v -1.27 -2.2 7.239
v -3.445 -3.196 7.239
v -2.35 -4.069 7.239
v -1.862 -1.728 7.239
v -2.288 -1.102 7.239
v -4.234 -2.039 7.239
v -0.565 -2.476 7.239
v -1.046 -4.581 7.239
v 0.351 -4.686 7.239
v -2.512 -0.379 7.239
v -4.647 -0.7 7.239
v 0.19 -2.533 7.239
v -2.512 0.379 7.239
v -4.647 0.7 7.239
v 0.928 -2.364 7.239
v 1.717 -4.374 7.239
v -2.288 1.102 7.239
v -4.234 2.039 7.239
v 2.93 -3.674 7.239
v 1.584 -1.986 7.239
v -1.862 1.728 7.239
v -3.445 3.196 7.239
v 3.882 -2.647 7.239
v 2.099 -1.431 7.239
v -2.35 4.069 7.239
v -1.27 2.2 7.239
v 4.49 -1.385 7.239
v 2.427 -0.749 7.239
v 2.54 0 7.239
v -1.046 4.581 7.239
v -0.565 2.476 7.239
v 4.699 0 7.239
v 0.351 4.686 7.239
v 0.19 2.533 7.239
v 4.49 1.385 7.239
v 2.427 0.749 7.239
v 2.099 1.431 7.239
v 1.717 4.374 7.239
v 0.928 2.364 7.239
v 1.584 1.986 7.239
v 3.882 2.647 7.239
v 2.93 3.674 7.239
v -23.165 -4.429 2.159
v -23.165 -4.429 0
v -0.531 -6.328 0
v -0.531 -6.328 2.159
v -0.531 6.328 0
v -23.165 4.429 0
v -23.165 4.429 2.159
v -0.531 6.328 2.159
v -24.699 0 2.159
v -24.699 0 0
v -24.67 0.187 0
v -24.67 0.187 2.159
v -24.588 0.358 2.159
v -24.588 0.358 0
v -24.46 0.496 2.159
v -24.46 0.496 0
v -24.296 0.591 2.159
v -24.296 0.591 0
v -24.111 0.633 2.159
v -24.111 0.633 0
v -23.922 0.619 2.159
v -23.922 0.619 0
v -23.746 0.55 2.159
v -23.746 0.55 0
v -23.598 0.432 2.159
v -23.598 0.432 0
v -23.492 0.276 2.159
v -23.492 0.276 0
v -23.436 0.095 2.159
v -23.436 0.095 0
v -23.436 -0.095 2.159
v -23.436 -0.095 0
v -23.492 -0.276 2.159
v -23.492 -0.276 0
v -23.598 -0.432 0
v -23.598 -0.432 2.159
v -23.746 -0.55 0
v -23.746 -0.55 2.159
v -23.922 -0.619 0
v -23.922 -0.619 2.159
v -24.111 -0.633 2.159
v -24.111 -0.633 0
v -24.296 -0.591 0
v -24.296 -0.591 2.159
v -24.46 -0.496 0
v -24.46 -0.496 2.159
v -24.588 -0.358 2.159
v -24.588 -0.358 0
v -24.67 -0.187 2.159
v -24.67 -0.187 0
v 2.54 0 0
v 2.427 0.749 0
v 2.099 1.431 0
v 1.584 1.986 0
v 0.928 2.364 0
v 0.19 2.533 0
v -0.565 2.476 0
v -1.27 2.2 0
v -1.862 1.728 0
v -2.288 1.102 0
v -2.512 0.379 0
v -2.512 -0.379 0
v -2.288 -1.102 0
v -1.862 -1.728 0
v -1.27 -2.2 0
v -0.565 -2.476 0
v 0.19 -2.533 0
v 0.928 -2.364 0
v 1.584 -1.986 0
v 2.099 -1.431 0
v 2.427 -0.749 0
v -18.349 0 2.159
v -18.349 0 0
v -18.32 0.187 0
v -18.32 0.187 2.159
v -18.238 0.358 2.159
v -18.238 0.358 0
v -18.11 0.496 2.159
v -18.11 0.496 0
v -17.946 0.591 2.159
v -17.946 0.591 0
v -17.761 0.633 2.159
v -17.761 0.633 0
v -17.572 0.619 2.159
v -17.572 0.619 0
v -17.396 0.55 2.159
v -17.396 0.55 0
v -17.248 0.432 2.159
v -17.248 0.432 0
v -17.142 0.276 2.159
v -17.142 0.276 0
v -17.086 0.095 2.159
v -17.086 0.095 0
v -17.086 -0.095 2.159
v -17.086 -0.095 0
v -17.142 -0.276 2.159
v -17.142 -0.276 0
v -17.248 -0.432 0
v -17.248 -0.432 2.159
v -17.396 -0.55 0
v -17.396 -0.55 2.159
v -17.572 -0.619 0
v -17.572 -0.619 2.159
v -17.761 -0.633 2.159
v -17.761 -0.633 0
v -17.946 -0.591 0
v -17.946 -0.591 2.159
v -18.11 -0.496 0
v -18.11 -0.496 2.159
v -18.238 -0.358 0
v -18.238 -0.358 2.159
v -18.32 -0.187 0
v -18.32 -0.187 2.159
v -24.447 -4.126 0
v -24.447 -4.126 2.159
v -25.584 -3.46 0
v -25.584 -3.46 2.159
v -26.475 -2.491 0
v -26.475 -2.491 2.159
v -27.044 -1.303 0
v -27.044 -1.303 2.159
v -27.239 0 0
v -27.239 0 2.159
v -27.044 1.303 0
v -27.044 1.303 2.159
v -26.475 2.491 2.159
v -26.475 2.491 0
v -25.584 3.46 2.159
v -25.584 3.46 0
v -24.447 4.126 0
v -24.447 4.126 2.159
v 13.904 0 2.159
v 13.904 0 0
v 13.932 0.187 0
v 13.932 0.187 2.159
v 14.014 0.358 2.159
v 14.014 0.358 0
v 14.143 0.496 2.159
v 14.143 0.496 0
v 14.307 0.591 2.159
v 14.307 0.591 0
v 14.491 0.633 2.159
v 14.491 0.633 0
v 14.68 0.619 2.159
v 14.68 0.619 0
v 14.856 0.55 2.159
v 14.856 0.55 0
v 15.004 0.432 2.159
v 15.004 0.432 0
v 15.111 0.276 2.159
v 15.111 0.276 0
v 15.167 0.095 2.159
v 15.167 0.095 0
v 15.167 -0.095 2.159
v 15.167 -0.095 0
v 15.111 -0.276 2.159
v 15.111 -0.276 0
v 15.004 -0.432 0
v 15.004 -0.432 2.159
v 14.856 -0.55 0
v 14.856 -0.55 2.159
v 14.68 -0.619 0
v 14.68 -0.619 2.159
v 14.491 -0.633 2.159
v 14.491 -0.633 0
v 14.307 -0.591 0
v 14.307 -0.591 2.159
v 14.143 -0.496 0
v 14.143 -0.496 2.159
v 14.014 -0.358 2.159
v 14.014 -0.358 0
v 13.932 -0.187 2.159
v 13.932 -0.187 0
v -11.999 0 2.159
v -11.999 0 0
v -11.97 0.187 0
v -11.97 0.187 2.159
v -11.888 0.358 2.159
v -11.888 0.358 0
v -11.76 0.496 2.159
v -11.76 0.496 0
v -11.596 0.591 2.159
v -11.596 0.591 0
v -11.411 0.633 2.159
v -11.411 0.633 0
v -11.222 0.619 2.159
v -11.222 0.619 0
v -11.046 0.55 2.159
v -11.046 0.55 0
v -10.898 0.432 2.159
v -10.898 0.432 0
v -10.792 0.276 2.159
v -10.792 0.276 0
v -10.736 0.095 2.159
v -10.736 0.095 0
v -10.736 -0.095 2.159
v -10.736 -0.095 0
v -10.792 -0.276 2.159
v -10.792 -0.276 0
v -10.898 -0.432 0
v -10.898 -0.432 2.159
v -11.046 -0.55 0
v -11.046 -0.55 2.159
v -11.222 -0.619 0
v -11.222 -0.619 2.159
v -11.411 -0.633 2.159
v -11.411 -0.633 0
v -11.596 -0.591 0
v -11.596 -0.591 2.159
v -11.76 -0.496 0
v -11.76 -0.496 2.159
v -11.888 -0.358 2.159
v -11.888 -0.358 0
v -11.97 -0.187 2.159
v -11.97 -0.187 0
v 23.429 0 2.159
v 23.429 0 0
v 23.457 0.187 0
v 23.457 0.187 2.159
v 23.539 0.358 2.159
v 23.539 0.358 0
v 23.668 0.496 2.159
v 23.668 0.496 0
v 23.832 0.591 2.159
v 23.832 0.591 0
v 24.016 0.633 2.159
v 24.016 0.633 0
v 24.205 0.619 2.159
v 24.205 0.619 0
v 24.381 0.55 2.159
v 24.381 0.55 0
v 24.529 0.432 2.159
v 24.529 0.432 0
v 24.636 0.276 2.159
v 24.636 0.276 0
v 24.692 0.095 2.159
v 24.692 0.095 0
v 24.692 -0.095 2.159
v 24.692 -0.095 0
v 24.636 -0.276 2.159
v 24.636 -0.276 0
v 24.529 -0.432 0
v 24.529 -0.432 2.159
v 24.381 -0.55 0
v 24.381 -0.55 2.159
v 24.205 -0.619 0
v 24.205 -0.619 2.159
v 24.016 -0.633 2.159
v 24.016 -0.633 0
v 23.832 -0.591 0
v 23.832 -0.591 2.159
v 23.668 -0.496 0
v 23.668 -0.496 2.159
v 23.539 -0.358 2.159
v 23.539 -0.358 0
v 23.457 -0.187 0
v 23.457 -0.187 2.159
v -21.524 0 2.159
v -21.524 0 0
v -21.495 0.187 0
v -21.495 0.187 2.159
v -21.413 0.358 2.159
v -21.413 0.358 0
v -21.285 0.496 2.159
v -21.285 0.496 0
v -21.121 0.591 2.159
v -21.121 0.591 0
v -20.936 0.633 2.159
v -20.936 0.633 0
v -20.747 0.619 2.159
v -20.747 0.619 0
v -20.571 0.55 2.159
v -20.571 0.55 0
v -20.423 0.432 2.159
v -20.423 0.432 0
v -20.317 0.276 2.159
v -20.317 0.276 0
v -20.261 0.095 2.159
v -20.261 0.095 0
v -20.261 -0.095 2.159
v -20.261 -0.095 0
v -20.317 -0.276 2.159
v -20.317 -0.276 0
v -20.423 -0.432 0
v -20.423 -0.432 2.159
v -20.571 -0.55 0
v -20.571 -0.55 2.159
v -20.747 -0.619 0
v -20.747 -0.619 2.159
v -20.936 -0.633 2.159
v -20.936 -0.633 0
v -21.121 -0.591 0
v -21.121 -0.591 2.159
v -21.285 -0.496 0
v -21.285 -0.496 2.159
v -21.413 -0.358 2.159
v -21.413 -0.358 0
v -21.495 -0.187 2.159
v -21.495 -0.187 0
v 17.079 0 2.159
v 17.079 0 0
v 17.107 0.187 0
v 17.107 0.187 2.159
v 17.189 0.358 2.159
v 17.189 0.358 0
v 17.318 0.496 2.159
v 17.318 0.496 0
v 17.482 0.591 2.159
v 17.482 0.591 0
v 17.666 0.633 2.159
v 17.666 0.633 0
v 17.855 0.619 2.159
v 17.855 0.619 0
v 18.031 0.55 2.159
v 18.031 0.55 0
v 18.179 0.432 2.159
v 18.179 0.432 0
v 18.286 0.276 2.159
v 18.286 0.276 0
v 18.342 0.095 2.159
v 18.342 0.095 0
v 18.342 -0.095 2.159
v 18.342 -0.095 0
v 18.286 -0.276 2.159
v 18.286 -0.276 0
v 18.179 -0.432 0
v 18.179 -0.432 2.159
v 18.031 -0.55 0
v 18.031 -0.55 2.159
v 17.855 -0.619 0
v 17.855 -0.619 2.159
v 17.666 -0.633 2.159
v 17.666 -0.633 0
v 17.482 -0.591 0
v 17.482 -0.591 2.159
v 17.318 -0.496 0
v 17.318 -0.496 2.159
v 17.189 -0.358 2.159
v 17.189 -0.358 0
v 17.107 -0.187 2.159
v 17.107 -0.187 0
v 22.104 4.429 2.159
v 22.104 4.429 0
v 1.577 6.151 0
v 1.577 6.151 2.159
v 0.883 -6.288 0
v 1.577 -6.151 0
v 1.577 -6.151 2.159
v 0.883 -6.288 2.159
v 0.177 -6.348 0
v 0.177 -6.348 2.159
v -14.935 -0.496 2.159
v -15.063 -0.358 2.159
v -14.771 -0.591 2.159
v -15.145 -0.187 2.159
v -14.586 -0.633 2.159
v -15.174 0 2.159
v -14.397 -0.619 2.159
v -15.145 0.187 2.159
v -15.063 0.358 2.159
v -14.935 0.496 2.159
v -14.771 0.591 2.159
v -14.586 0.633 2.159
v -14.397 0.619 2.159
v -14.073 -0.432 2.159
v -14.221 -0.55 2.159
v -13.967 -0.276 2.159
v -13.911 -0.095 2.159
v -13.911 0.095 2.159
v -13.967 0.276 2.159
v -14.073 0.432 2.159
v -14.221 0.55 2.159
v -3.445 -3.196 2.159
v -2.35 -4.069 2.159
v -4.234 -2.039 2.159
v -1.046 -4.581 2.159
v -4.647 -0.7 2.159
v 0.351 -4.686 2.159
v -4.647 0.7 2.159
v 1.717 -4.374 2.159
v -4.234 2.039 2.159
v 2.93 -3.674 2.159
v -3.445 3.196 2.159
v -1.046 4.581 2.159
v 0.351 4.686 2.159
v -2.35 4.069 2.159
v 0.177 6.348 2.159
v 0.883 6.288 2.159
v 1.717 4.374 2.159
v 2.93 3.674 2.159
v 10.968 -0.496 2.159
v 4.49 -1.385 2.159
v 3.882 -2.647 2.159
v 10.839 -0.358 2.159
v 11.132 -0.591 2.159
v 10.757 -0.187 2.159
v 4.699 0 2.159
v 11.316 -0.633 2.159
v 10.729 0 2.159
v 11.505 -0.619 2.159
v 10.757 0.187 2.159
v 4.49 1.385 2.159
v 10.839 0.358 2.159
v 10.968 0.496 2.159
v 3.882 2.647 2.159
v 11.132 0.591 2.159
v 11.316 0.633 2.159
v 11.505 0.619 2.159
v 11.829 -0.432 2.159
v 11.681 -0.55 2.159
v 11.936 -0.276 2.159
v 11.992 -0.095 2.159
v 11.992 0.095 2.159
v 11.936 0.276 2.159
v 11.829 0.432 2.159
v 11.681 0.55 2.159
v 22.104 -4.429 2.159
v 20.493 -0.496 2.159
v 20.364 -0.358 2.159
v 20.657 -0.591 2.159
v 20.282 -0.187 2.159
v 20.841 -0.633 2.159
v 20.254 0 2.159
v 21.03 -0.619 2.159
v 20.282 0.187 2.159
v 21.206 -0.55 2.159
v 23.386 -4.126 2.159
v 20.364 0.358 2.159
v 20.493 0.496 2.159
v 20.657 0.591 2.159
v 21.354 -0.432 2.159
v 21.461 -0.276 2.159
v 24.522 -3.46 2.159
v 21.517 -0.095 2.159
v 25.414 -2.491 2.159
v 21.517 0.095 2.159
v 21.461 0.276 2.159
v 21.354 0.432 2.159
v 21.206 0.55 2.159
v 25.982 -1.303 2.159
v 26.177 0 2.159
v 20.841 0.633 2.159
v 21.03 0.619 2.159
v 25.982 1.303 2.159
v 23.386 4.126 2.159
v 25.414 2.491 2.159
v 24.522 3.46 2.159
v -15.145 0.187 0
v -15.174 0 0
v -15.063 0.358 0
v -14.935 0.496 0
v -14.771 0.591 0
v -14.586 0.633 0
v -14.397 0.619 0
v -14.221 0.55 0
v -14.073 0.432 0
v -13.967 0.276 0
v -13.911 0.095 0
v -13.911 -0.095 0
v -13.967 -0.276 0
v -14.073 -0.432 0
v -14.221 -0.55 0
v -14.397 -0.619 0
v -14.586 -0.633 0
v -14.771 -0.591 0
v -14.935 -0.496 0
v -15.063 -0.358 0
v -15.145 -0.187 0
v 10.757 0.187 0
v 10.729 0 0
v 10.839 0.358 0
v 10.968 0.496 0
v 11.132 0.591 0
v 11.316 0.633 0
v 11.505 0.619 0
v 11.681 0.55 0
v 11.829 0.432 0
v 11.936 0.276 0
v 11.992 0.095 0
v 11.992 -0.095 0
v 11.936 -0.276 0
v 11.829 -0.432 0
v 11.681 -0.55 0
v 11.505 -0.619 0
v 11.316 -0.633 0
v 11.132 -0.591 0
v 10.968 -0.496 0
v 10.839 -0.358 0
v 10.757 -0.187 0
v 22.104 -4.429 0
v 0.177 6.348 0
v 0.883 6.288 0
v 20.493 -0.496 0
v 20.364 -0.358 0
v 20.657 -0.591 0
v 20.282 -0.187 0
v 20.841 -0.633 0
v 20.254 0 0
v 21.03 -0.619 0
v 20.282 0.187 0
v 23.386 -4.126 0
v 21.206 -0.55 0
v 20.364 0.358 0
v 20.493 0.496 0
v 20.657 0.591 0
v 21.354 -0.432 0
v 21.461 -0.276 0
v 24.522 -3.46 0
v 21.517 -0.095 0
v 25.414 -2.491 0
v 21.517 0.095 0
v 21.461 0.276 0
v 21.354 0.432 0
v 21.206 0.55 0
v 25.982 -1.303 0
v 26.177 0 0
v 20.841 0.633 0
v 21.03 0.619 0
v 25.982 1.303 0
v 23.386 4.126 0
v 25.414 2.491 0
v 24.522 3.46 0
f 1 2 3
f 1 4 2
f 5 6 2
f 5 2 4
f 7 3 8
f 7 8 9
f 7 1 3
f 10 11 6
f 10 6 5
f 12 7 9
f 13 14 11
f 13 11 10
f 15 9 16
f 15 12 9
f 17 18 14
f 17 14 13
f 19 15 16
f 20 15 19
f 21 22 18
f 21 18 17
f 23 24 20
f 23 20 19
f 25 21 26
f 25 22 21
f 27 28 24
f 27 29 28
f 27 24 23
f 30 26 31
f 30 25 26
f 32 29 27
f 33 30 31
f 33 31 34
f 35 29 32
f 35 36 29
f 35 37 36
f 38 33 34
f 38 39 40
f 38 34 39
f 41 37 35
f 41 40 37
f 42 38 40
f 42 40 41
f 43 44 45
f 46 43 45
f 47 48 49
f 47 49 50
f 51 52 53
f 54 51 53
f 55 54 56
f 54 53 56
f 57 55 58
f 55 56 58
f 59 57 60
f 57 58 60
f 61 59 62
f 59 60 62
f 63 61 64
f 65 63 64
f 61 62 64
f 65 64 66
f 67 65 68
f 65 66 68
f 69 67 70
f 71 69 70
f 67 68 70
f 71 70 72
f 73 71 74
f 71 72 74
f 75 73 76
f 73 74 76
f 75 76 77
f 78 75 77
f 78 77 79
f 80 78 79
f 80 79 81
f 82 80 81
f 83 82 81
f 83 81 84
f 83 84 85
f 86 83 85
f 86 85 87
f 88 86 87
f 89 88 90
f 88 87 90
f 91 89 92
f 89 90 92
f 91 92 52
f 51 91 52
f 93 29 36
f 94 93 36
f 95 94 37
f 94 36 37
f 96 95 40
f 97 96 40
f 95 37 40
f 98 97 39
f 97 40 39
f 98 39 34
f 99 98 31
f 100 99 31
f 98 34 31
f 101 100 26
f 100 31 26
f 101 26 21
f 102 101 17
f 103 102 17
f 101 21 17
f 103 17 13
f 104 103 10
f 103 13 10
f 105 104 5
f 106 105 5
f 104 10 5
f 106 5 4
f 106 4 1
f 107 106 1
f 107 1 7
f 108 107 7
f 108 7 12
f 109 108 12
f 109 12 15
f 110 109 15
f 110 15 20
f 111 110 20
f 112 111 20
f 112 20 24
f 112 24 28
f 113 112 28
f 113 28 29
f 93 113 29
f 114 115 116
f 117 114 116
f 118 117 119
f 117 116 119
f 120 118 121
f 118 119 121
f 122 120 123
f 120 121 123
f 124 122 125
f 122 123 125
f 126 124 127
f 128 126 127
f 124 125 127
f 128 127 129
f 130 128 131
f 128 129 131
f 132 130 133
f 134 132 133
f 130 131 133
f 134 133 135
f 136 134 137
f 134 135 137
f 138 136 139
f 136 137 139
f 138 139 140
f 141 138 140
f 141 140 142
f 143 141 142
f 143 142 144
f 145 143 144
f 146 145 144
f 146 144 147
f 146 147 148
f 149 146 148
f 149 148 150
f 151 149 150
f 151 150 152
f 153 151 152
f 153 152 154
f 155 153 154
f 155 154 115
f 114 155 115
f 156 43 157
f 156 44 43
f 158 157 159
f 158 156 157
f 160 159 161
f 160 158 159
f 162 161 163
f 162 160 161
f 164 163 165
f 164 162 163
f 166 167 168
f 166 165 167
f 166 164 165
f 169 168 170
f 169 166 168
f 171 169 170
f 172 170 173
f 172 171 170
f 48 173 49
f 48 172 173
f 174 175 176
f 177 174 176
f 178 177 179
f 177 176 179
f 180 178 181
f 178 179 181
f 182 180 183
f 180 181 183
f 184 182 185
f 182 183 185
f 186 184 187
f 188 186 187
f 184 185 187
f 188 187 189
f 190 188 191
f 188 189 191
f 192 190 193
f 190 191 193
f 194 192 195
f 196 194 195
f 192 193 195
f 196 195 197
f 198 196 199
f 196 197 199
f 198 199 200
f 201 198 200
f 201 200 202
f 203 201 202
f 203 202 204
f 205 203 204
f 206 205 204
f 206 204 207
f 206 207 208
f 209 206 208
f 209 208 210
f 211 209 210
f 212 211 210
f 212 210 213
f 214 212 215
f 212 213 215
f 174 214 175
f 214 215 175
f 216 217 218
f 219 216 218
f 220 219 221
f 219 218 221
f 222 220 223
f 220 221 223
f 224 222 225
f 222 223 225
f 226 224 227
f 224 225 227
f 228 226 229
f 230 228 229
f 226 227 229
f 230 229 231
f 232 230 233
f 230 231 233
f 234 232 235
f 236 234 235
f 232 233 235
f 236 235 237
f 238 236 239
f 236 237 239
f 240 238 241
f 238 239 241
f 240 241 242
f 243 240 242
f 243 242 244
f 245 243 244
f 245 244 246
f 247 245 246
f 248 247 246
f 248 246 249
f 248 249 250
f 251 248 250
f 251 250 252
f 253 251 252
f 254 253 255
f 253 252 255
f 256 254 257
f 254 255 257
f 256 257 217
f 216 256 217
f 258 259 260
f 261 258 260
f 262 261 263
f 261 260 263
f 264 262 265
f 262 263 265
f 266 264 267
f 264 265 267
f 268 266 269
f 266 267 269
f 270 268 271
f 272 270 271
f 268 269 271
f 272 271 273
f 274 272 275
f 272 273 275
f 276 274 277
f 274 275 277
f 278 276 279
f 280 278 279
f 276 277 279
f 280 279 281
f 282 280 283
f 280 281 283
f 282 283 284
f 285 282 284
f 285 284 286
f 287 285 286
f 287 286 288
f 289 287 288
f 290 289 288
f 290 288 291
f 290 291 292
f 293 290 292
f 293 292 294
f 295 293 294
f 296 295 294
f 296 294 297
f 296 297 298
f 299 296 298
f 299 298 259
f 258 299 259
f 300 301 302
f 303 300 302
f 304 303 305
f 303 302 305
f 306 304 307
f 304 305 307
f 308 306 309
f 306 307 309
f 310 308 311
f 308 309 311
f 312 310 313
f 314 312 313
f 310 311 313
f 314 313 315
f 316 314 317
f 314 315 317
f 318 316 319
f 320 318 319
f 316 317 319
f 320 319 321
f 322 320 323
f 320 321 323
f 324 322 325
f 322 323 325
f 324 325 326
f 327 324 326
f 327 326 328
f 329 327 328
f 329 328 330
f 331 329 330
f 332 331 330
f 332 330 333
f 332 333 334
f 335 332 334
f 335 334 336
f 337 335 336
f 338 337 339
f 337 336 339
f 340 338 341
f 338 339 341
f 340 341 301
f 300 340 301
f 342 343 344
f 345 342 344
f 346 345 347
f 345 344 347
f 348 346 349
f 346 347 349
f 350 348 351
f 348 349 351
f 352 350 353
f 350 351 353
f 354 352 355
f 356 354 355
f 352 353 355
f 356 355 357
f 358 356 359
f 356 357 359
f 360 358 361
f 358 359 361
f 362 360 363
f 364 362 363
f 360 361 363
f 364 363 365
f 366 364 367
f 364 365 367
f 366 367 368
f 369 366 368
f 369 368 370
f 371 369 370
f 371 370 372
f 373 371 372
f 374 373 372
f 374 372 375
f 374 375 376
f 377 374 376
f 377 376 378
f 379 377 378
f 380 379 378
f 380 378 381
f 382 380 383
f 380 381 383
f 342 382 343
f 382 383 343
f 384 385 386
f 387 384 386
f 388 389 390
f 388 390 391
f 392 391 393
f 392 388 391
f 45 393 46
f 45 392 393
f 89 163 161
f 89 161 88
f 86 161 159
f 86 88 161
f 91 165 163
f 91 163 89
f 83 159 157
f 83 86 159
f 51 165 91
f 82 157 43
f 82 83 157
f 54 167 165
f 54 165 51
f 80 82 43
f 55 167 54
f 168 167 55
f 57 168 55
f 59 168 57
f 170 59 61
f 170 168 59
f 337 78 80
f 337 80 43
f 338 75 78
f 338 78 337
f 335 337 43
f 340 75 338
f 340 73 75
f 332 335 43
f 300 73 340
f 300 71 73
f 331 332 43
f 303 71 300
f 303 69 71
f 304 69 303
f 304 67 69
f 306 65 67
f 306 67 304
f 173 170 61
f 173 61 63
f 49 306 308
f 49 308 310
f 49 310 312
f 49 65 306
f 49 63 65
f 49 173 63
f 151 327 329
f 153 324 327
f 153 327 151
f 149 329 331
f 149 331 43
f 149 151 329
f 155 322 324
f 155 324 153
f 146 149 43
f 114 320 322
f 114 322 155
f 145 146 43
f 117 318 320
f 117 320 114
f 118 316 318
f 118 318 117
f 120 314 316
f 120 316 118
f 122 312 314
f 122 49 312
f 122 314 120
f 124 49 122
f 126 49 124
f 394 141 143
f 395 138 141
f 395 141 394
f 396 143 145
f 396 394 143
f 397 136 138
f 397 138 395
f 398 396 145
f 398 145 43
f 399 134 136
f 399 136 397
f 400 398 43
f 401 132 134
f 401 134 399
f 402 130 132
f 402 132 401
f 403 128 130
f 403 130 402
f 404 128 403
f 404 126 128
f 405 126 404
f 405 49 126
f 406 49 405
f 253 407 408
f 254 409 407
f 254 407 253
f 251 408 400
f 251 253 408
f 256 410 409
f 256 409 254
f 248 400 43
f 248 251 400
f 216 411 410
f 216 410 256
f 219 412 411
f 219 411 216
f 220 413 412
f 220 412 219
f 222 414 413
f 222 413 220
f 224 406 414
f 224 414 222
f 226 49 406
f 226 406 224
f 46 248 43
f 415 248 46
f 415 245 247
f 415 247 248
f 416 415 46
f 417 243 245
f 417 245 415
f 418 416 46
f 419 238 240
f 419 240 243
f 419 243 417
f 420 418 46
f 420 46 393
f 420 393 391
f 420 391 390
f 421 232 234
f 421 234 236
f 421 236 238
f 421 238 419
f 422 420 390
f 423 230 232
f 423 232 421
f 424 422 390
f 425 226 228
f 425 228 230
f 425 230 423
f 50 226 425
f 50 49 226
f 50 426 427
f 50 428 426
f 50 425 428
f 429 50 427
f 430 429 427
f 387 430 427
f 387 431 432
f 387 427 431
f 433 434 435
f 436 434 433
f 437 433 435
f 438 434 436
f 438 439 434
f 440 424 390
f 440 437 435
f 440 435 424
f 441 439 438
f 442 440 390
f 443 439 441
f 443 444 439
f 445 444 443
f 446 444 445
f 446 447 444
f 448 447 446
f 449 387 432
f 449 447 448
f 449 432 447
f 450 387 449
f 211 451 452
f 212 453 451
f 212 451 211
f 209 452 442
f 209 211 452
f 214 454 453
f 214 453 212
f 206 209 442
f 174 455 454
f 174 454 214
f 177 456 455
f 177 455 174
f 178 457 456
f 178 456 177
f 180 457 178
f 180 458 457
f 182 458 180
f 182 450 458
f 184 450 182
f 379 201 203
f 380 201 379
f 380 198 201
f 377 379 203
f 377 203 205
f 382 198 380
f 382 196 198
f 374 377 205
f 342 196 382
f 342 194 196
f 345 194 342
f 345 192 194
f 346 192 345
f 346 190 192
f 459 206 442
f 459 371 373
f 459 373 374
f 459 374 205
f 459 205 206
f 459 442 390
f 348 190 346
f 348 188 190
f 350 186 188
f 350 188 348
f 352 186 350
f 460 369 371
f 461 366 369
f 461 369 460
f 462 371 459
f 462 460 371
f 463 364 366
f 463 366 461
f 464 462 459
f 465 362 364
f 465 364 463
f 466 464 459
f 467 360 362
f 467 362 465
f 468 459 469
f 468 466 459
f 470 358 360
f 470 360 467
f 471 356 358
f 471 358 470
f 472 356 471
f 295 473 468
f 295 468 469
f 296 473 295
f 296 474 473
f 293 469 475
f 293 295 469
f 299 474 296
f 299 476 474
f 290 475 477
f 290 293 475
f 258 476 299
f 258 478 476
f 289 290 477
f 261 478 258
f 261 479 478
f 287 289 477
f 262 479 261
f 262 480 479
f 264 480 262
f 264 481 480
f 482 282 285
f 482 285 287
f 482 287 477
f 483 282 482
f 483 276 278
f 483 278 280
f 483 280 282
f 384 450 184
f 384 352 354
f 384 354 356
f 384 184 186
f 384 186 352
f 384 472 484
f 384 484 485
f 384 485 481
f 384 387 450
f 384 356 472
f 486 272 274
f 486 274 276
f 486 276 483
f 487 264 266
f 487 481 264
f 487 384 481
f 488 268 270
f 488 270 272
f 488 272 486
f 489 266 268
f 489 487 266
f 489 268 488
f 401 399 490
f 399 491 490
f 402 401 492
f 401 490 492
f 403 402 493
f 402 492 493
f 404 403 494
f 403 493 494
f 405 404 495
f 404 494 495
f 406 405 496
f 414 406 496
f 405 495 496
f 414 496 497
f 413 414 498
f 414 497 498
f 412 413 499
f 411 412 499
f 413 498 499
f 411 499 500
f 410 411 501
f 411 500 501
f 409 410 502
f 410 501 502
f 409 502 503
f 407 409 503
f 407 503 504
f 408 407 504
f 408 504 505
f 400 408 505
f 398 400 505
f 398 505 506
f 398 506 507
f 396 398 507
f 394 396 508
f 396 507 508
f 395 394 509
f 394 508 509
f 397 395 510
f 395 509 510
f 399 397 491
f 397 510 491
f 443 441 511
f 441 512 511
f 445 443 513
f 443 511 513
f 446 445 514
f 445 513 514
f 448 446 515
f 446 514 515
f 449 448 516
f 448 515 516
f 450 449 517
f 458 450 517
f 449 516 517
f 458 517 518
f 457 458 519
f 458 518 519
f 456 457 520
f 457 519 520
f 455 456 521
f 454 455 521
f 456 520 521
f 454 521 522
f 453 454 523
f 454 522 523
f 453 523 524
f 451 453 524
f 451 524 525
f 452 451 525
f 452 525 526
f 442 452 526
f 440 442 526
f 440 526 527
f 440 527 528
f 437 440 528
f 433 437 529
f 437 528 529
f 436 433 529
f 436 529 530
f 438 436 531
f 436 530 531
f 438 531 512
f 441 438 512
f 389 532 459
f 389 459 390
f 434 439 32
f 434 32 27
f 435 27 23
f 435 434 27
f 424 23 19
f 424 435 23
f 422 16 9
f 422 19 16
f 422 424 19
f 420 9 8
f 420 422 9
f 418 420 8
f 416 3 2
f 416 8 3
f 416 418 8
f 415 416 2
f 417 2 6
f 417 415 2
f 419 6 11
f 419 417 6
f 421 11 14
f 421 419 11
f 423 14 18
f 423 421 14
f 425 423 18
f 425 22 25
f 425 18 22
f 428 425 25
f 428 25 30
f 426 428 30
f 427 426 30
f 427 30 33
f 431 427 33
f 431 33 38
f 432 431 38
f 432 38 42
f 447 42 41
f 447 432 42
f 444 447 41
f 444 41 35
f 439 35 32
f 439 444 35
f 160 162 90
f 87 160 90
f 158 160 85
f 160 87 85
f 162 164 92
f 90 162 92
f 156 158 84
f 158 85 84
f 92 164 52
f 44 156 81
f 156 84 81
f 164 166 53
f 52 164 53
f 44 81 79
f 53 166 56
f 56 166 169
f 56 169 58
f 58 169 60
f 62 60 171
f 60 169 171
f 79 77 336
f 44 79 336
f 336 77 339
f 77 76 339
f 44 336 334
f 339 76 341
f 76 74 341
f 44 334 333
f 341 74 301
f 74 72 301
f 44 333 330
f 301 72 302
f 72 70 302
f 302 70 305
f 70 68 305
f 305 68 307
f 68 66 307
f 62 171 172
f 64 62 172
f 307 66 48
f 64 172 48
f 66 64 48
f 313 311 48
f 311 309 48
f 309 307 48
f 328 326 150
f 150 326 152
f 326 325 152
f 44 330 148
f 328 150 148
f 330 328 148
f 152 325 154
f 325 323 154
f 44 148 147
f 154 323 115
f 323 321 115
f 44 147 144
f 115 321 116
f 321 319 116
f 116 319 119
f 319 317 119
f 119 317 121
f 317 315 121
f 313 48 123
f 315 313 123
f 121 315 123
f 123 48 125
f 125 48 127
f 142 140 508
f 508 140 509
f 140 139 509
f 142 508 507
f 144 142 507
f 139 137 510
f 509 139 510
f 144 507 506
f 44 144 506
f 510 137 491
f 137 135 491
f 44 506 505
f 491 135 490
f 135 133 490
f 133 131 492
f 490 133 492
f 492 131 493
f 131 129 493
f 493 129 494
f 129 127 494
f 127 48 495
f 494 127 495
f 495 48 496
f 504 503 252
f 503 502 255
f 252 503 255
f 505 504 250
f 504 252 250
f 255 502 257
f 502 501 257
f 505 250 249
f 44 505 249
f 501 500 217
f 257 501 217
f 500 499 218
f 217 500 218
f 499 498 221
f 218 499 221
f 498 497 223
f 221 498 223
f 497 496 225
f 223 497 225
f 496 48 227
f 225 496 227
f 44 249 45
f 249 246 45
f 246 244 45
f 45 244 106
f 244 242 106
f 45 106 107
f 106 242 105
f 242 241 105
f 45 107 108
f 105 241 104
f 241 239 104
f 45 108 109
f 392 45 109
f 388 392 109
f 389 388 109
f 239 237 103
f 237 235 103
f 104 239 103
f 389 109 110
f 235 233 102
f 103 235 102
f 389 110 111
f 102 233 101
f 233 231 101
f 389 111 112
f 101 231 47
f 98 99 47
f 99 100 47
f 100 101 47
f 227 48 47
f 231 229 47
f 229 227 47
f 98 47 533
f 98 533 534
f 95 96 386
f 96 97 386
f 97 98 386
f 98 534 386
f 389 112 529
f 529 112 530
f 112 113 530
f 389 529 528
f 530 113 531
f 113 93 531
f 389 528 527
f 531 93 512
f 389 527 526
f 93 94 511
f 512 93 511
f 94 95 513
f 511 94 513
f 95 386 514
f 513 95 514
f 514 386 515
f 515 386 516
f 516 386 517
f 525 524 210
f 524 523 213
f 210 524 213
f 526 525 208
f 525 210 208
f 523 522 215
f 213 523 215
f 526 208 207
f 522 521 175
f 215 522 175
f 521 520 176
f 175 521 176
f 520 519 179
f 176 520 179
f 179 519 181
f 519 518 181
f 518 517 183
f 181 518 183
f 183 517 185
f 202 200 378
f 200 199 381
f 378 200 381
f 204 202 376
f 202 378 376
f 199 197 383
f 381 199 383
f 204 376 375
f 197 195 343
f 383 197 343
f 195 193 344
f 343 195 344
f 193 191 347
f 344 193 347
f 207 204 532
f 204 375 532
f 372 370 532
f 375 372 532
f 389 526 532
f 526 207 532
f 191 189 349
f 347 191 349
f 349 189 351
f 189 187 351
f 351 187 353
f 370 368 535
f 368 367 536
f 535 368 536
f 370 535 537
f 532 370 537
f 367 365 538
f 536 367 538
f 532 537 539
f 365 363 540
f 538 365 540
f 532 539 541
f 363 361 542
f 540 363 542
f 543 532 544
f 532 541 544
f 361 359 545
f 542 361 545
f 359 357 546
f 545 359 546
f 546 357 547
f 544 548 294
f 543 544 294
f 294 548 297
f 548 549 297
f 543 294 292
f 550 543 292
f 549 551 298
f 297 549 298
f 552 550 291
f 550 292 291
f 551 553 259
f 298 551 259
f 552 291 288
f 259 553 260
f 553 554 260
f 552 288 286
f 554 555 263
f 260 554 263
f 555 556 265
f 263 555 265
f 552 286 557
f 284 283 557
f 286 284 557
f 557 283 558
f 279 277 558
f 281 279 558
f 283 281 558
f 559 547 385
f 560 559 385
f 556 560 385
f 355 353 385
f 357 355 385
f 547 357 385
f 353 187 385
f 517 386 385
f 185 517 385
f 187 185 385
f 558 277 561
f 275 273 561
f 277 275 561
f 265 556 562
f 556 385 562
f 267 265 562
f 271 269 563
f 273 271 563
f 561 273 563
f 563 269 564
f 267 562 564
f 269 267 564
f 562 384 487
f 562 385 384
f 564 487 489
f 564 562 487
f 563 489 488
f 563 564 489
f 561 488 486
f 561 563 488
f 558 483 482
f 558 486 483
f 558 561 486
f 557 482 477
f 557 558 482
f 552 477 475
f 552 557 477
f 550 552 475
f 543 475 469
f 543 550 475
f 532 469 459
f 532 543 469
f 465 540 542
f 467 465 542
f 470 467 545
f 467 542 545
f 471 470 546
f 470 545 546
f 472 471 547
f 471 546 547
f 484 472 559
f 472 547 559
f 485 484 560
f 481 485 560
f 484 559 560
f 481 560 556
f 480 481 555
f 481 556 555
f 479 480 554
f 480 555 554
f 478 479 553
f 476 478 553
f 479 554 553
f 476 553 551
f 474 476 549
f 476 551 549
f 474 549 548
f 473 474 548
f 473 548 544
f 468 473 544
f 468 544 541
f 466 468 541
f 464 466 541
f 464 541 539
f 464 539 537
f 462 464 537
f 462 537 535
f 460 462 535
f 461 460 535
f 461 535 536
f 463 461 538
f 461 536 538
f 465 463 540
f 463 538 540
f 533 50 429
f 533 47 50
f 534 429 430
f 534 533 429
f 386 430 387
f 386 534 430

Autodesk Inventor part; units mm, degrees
ref_plane "YZ Plane" through (0, 0, 0) normal (1, 0, 0) x (0, 1, 0)
ref_plane "XZ Plane" through (0, 0, 0) normal (0, 1, 0) x (-1, 0, 0)
ref_plane "XY Plane" through (0, 0, 0) normal (0, 0, 1) x (1, 0, 0)
sketch "Sketch2" plane through (0, 0, 0) normal (0, 0, 1) x (1, 0, 0)
  line L0 (-10.4096, 0) -> (10.4096, 0) construction
  circle A0 centre (0, 0) radius 6.35
  circle A1 centre (21.7323, 0) radius 4.445
  circle A2 centre (-22.7937, 0) radius 4.445
  line L1 (-23.1652, 4.4294) -> (-0.5307, 6.3278)
  line L2 (22.1038, 4.4294) -> (-0.5307, 6.3278)
  line L3 (22.1038, -4.4294) -> (-0.5307, -6.3278)
  line L4 (-23.1652, -4.4294) -> (-0.5307, -6.3278)
  dimension "d4" = 12.7
  dimension "d5" = 8.89
  dimension "d6" = 8.89
extrude "Extrusion2" add sketch "Sketch2" along normal blind 2.159
sketch "Sketch3" plane through (0, 0, 2.159) normal (0, 0, 1) x (1, 0, 0)
  circle A0 centre (0, 0) radius 4.699
  dimension "d11" = 9.398
extrude "Extrusion3" add sketch "Sketch3" along normal blind 5.08
sketch "Sketch4" plane through (0, 0, 7.239) normal (0, 0, 1) x (1, 0, 0)
  circle A0 centre (0, 0) radius 2.54
  dimension "d14" = 5.08
extrude "Extrusion4" cut sketch "Sketch4" against normal through all
sketch "Sketch5" plane through (0, 0, 0) normal (0, 0, -1) x (-1, 0, 0)
  circle A0 centre (24.0637, 0) radius 0.635
  arc A1 (23.1652, -4.4294) -> (23.1652, 4.4294) centre (22.7937, 0) ccw projected
  line L0 (24.0637, 0) -> (4.699, 0)
  circle A2 centre (0, 0) radius 4.699 projected
  circle A3 centre (20.8887, 0) radius 0.635
  circle A4 centre (17.7137, 0) radius 0.635
  circle A5 centre (14.5387, 0) radius 0.635
  circle A6 centre (11.3637, 0) radius 0.635
  line L1 (0, 0) -> (0, -5.8284)
  circle A7 centre (-24.0637, 0) radius 0.635
  circle A8 centre (-20.8887, 0) radius 0.635
  circle A9 centre (-17.7137, 0) radius 0.635
  circle A10 centre (-14.5387, 0) radius 0.635
  circle A11 centre (-11.3637, 0) radius 0.635
  dimension "d17" = 1.27
  dimension "d18" = 2.54
  dimension "d21" = 3.175
extrude "Extrusion5" cut sketch "Sketch5" against normal through all contours A0 | A6 L0 | L0 A6 | A5 L0 | L0 A5 | A4 L0 | L0 A4 | A3 L0 | L0 A3 | A7 | A8 | A9 | A10 | A11
equation "\"d6\" = d5"
properties part number "servo arm"
